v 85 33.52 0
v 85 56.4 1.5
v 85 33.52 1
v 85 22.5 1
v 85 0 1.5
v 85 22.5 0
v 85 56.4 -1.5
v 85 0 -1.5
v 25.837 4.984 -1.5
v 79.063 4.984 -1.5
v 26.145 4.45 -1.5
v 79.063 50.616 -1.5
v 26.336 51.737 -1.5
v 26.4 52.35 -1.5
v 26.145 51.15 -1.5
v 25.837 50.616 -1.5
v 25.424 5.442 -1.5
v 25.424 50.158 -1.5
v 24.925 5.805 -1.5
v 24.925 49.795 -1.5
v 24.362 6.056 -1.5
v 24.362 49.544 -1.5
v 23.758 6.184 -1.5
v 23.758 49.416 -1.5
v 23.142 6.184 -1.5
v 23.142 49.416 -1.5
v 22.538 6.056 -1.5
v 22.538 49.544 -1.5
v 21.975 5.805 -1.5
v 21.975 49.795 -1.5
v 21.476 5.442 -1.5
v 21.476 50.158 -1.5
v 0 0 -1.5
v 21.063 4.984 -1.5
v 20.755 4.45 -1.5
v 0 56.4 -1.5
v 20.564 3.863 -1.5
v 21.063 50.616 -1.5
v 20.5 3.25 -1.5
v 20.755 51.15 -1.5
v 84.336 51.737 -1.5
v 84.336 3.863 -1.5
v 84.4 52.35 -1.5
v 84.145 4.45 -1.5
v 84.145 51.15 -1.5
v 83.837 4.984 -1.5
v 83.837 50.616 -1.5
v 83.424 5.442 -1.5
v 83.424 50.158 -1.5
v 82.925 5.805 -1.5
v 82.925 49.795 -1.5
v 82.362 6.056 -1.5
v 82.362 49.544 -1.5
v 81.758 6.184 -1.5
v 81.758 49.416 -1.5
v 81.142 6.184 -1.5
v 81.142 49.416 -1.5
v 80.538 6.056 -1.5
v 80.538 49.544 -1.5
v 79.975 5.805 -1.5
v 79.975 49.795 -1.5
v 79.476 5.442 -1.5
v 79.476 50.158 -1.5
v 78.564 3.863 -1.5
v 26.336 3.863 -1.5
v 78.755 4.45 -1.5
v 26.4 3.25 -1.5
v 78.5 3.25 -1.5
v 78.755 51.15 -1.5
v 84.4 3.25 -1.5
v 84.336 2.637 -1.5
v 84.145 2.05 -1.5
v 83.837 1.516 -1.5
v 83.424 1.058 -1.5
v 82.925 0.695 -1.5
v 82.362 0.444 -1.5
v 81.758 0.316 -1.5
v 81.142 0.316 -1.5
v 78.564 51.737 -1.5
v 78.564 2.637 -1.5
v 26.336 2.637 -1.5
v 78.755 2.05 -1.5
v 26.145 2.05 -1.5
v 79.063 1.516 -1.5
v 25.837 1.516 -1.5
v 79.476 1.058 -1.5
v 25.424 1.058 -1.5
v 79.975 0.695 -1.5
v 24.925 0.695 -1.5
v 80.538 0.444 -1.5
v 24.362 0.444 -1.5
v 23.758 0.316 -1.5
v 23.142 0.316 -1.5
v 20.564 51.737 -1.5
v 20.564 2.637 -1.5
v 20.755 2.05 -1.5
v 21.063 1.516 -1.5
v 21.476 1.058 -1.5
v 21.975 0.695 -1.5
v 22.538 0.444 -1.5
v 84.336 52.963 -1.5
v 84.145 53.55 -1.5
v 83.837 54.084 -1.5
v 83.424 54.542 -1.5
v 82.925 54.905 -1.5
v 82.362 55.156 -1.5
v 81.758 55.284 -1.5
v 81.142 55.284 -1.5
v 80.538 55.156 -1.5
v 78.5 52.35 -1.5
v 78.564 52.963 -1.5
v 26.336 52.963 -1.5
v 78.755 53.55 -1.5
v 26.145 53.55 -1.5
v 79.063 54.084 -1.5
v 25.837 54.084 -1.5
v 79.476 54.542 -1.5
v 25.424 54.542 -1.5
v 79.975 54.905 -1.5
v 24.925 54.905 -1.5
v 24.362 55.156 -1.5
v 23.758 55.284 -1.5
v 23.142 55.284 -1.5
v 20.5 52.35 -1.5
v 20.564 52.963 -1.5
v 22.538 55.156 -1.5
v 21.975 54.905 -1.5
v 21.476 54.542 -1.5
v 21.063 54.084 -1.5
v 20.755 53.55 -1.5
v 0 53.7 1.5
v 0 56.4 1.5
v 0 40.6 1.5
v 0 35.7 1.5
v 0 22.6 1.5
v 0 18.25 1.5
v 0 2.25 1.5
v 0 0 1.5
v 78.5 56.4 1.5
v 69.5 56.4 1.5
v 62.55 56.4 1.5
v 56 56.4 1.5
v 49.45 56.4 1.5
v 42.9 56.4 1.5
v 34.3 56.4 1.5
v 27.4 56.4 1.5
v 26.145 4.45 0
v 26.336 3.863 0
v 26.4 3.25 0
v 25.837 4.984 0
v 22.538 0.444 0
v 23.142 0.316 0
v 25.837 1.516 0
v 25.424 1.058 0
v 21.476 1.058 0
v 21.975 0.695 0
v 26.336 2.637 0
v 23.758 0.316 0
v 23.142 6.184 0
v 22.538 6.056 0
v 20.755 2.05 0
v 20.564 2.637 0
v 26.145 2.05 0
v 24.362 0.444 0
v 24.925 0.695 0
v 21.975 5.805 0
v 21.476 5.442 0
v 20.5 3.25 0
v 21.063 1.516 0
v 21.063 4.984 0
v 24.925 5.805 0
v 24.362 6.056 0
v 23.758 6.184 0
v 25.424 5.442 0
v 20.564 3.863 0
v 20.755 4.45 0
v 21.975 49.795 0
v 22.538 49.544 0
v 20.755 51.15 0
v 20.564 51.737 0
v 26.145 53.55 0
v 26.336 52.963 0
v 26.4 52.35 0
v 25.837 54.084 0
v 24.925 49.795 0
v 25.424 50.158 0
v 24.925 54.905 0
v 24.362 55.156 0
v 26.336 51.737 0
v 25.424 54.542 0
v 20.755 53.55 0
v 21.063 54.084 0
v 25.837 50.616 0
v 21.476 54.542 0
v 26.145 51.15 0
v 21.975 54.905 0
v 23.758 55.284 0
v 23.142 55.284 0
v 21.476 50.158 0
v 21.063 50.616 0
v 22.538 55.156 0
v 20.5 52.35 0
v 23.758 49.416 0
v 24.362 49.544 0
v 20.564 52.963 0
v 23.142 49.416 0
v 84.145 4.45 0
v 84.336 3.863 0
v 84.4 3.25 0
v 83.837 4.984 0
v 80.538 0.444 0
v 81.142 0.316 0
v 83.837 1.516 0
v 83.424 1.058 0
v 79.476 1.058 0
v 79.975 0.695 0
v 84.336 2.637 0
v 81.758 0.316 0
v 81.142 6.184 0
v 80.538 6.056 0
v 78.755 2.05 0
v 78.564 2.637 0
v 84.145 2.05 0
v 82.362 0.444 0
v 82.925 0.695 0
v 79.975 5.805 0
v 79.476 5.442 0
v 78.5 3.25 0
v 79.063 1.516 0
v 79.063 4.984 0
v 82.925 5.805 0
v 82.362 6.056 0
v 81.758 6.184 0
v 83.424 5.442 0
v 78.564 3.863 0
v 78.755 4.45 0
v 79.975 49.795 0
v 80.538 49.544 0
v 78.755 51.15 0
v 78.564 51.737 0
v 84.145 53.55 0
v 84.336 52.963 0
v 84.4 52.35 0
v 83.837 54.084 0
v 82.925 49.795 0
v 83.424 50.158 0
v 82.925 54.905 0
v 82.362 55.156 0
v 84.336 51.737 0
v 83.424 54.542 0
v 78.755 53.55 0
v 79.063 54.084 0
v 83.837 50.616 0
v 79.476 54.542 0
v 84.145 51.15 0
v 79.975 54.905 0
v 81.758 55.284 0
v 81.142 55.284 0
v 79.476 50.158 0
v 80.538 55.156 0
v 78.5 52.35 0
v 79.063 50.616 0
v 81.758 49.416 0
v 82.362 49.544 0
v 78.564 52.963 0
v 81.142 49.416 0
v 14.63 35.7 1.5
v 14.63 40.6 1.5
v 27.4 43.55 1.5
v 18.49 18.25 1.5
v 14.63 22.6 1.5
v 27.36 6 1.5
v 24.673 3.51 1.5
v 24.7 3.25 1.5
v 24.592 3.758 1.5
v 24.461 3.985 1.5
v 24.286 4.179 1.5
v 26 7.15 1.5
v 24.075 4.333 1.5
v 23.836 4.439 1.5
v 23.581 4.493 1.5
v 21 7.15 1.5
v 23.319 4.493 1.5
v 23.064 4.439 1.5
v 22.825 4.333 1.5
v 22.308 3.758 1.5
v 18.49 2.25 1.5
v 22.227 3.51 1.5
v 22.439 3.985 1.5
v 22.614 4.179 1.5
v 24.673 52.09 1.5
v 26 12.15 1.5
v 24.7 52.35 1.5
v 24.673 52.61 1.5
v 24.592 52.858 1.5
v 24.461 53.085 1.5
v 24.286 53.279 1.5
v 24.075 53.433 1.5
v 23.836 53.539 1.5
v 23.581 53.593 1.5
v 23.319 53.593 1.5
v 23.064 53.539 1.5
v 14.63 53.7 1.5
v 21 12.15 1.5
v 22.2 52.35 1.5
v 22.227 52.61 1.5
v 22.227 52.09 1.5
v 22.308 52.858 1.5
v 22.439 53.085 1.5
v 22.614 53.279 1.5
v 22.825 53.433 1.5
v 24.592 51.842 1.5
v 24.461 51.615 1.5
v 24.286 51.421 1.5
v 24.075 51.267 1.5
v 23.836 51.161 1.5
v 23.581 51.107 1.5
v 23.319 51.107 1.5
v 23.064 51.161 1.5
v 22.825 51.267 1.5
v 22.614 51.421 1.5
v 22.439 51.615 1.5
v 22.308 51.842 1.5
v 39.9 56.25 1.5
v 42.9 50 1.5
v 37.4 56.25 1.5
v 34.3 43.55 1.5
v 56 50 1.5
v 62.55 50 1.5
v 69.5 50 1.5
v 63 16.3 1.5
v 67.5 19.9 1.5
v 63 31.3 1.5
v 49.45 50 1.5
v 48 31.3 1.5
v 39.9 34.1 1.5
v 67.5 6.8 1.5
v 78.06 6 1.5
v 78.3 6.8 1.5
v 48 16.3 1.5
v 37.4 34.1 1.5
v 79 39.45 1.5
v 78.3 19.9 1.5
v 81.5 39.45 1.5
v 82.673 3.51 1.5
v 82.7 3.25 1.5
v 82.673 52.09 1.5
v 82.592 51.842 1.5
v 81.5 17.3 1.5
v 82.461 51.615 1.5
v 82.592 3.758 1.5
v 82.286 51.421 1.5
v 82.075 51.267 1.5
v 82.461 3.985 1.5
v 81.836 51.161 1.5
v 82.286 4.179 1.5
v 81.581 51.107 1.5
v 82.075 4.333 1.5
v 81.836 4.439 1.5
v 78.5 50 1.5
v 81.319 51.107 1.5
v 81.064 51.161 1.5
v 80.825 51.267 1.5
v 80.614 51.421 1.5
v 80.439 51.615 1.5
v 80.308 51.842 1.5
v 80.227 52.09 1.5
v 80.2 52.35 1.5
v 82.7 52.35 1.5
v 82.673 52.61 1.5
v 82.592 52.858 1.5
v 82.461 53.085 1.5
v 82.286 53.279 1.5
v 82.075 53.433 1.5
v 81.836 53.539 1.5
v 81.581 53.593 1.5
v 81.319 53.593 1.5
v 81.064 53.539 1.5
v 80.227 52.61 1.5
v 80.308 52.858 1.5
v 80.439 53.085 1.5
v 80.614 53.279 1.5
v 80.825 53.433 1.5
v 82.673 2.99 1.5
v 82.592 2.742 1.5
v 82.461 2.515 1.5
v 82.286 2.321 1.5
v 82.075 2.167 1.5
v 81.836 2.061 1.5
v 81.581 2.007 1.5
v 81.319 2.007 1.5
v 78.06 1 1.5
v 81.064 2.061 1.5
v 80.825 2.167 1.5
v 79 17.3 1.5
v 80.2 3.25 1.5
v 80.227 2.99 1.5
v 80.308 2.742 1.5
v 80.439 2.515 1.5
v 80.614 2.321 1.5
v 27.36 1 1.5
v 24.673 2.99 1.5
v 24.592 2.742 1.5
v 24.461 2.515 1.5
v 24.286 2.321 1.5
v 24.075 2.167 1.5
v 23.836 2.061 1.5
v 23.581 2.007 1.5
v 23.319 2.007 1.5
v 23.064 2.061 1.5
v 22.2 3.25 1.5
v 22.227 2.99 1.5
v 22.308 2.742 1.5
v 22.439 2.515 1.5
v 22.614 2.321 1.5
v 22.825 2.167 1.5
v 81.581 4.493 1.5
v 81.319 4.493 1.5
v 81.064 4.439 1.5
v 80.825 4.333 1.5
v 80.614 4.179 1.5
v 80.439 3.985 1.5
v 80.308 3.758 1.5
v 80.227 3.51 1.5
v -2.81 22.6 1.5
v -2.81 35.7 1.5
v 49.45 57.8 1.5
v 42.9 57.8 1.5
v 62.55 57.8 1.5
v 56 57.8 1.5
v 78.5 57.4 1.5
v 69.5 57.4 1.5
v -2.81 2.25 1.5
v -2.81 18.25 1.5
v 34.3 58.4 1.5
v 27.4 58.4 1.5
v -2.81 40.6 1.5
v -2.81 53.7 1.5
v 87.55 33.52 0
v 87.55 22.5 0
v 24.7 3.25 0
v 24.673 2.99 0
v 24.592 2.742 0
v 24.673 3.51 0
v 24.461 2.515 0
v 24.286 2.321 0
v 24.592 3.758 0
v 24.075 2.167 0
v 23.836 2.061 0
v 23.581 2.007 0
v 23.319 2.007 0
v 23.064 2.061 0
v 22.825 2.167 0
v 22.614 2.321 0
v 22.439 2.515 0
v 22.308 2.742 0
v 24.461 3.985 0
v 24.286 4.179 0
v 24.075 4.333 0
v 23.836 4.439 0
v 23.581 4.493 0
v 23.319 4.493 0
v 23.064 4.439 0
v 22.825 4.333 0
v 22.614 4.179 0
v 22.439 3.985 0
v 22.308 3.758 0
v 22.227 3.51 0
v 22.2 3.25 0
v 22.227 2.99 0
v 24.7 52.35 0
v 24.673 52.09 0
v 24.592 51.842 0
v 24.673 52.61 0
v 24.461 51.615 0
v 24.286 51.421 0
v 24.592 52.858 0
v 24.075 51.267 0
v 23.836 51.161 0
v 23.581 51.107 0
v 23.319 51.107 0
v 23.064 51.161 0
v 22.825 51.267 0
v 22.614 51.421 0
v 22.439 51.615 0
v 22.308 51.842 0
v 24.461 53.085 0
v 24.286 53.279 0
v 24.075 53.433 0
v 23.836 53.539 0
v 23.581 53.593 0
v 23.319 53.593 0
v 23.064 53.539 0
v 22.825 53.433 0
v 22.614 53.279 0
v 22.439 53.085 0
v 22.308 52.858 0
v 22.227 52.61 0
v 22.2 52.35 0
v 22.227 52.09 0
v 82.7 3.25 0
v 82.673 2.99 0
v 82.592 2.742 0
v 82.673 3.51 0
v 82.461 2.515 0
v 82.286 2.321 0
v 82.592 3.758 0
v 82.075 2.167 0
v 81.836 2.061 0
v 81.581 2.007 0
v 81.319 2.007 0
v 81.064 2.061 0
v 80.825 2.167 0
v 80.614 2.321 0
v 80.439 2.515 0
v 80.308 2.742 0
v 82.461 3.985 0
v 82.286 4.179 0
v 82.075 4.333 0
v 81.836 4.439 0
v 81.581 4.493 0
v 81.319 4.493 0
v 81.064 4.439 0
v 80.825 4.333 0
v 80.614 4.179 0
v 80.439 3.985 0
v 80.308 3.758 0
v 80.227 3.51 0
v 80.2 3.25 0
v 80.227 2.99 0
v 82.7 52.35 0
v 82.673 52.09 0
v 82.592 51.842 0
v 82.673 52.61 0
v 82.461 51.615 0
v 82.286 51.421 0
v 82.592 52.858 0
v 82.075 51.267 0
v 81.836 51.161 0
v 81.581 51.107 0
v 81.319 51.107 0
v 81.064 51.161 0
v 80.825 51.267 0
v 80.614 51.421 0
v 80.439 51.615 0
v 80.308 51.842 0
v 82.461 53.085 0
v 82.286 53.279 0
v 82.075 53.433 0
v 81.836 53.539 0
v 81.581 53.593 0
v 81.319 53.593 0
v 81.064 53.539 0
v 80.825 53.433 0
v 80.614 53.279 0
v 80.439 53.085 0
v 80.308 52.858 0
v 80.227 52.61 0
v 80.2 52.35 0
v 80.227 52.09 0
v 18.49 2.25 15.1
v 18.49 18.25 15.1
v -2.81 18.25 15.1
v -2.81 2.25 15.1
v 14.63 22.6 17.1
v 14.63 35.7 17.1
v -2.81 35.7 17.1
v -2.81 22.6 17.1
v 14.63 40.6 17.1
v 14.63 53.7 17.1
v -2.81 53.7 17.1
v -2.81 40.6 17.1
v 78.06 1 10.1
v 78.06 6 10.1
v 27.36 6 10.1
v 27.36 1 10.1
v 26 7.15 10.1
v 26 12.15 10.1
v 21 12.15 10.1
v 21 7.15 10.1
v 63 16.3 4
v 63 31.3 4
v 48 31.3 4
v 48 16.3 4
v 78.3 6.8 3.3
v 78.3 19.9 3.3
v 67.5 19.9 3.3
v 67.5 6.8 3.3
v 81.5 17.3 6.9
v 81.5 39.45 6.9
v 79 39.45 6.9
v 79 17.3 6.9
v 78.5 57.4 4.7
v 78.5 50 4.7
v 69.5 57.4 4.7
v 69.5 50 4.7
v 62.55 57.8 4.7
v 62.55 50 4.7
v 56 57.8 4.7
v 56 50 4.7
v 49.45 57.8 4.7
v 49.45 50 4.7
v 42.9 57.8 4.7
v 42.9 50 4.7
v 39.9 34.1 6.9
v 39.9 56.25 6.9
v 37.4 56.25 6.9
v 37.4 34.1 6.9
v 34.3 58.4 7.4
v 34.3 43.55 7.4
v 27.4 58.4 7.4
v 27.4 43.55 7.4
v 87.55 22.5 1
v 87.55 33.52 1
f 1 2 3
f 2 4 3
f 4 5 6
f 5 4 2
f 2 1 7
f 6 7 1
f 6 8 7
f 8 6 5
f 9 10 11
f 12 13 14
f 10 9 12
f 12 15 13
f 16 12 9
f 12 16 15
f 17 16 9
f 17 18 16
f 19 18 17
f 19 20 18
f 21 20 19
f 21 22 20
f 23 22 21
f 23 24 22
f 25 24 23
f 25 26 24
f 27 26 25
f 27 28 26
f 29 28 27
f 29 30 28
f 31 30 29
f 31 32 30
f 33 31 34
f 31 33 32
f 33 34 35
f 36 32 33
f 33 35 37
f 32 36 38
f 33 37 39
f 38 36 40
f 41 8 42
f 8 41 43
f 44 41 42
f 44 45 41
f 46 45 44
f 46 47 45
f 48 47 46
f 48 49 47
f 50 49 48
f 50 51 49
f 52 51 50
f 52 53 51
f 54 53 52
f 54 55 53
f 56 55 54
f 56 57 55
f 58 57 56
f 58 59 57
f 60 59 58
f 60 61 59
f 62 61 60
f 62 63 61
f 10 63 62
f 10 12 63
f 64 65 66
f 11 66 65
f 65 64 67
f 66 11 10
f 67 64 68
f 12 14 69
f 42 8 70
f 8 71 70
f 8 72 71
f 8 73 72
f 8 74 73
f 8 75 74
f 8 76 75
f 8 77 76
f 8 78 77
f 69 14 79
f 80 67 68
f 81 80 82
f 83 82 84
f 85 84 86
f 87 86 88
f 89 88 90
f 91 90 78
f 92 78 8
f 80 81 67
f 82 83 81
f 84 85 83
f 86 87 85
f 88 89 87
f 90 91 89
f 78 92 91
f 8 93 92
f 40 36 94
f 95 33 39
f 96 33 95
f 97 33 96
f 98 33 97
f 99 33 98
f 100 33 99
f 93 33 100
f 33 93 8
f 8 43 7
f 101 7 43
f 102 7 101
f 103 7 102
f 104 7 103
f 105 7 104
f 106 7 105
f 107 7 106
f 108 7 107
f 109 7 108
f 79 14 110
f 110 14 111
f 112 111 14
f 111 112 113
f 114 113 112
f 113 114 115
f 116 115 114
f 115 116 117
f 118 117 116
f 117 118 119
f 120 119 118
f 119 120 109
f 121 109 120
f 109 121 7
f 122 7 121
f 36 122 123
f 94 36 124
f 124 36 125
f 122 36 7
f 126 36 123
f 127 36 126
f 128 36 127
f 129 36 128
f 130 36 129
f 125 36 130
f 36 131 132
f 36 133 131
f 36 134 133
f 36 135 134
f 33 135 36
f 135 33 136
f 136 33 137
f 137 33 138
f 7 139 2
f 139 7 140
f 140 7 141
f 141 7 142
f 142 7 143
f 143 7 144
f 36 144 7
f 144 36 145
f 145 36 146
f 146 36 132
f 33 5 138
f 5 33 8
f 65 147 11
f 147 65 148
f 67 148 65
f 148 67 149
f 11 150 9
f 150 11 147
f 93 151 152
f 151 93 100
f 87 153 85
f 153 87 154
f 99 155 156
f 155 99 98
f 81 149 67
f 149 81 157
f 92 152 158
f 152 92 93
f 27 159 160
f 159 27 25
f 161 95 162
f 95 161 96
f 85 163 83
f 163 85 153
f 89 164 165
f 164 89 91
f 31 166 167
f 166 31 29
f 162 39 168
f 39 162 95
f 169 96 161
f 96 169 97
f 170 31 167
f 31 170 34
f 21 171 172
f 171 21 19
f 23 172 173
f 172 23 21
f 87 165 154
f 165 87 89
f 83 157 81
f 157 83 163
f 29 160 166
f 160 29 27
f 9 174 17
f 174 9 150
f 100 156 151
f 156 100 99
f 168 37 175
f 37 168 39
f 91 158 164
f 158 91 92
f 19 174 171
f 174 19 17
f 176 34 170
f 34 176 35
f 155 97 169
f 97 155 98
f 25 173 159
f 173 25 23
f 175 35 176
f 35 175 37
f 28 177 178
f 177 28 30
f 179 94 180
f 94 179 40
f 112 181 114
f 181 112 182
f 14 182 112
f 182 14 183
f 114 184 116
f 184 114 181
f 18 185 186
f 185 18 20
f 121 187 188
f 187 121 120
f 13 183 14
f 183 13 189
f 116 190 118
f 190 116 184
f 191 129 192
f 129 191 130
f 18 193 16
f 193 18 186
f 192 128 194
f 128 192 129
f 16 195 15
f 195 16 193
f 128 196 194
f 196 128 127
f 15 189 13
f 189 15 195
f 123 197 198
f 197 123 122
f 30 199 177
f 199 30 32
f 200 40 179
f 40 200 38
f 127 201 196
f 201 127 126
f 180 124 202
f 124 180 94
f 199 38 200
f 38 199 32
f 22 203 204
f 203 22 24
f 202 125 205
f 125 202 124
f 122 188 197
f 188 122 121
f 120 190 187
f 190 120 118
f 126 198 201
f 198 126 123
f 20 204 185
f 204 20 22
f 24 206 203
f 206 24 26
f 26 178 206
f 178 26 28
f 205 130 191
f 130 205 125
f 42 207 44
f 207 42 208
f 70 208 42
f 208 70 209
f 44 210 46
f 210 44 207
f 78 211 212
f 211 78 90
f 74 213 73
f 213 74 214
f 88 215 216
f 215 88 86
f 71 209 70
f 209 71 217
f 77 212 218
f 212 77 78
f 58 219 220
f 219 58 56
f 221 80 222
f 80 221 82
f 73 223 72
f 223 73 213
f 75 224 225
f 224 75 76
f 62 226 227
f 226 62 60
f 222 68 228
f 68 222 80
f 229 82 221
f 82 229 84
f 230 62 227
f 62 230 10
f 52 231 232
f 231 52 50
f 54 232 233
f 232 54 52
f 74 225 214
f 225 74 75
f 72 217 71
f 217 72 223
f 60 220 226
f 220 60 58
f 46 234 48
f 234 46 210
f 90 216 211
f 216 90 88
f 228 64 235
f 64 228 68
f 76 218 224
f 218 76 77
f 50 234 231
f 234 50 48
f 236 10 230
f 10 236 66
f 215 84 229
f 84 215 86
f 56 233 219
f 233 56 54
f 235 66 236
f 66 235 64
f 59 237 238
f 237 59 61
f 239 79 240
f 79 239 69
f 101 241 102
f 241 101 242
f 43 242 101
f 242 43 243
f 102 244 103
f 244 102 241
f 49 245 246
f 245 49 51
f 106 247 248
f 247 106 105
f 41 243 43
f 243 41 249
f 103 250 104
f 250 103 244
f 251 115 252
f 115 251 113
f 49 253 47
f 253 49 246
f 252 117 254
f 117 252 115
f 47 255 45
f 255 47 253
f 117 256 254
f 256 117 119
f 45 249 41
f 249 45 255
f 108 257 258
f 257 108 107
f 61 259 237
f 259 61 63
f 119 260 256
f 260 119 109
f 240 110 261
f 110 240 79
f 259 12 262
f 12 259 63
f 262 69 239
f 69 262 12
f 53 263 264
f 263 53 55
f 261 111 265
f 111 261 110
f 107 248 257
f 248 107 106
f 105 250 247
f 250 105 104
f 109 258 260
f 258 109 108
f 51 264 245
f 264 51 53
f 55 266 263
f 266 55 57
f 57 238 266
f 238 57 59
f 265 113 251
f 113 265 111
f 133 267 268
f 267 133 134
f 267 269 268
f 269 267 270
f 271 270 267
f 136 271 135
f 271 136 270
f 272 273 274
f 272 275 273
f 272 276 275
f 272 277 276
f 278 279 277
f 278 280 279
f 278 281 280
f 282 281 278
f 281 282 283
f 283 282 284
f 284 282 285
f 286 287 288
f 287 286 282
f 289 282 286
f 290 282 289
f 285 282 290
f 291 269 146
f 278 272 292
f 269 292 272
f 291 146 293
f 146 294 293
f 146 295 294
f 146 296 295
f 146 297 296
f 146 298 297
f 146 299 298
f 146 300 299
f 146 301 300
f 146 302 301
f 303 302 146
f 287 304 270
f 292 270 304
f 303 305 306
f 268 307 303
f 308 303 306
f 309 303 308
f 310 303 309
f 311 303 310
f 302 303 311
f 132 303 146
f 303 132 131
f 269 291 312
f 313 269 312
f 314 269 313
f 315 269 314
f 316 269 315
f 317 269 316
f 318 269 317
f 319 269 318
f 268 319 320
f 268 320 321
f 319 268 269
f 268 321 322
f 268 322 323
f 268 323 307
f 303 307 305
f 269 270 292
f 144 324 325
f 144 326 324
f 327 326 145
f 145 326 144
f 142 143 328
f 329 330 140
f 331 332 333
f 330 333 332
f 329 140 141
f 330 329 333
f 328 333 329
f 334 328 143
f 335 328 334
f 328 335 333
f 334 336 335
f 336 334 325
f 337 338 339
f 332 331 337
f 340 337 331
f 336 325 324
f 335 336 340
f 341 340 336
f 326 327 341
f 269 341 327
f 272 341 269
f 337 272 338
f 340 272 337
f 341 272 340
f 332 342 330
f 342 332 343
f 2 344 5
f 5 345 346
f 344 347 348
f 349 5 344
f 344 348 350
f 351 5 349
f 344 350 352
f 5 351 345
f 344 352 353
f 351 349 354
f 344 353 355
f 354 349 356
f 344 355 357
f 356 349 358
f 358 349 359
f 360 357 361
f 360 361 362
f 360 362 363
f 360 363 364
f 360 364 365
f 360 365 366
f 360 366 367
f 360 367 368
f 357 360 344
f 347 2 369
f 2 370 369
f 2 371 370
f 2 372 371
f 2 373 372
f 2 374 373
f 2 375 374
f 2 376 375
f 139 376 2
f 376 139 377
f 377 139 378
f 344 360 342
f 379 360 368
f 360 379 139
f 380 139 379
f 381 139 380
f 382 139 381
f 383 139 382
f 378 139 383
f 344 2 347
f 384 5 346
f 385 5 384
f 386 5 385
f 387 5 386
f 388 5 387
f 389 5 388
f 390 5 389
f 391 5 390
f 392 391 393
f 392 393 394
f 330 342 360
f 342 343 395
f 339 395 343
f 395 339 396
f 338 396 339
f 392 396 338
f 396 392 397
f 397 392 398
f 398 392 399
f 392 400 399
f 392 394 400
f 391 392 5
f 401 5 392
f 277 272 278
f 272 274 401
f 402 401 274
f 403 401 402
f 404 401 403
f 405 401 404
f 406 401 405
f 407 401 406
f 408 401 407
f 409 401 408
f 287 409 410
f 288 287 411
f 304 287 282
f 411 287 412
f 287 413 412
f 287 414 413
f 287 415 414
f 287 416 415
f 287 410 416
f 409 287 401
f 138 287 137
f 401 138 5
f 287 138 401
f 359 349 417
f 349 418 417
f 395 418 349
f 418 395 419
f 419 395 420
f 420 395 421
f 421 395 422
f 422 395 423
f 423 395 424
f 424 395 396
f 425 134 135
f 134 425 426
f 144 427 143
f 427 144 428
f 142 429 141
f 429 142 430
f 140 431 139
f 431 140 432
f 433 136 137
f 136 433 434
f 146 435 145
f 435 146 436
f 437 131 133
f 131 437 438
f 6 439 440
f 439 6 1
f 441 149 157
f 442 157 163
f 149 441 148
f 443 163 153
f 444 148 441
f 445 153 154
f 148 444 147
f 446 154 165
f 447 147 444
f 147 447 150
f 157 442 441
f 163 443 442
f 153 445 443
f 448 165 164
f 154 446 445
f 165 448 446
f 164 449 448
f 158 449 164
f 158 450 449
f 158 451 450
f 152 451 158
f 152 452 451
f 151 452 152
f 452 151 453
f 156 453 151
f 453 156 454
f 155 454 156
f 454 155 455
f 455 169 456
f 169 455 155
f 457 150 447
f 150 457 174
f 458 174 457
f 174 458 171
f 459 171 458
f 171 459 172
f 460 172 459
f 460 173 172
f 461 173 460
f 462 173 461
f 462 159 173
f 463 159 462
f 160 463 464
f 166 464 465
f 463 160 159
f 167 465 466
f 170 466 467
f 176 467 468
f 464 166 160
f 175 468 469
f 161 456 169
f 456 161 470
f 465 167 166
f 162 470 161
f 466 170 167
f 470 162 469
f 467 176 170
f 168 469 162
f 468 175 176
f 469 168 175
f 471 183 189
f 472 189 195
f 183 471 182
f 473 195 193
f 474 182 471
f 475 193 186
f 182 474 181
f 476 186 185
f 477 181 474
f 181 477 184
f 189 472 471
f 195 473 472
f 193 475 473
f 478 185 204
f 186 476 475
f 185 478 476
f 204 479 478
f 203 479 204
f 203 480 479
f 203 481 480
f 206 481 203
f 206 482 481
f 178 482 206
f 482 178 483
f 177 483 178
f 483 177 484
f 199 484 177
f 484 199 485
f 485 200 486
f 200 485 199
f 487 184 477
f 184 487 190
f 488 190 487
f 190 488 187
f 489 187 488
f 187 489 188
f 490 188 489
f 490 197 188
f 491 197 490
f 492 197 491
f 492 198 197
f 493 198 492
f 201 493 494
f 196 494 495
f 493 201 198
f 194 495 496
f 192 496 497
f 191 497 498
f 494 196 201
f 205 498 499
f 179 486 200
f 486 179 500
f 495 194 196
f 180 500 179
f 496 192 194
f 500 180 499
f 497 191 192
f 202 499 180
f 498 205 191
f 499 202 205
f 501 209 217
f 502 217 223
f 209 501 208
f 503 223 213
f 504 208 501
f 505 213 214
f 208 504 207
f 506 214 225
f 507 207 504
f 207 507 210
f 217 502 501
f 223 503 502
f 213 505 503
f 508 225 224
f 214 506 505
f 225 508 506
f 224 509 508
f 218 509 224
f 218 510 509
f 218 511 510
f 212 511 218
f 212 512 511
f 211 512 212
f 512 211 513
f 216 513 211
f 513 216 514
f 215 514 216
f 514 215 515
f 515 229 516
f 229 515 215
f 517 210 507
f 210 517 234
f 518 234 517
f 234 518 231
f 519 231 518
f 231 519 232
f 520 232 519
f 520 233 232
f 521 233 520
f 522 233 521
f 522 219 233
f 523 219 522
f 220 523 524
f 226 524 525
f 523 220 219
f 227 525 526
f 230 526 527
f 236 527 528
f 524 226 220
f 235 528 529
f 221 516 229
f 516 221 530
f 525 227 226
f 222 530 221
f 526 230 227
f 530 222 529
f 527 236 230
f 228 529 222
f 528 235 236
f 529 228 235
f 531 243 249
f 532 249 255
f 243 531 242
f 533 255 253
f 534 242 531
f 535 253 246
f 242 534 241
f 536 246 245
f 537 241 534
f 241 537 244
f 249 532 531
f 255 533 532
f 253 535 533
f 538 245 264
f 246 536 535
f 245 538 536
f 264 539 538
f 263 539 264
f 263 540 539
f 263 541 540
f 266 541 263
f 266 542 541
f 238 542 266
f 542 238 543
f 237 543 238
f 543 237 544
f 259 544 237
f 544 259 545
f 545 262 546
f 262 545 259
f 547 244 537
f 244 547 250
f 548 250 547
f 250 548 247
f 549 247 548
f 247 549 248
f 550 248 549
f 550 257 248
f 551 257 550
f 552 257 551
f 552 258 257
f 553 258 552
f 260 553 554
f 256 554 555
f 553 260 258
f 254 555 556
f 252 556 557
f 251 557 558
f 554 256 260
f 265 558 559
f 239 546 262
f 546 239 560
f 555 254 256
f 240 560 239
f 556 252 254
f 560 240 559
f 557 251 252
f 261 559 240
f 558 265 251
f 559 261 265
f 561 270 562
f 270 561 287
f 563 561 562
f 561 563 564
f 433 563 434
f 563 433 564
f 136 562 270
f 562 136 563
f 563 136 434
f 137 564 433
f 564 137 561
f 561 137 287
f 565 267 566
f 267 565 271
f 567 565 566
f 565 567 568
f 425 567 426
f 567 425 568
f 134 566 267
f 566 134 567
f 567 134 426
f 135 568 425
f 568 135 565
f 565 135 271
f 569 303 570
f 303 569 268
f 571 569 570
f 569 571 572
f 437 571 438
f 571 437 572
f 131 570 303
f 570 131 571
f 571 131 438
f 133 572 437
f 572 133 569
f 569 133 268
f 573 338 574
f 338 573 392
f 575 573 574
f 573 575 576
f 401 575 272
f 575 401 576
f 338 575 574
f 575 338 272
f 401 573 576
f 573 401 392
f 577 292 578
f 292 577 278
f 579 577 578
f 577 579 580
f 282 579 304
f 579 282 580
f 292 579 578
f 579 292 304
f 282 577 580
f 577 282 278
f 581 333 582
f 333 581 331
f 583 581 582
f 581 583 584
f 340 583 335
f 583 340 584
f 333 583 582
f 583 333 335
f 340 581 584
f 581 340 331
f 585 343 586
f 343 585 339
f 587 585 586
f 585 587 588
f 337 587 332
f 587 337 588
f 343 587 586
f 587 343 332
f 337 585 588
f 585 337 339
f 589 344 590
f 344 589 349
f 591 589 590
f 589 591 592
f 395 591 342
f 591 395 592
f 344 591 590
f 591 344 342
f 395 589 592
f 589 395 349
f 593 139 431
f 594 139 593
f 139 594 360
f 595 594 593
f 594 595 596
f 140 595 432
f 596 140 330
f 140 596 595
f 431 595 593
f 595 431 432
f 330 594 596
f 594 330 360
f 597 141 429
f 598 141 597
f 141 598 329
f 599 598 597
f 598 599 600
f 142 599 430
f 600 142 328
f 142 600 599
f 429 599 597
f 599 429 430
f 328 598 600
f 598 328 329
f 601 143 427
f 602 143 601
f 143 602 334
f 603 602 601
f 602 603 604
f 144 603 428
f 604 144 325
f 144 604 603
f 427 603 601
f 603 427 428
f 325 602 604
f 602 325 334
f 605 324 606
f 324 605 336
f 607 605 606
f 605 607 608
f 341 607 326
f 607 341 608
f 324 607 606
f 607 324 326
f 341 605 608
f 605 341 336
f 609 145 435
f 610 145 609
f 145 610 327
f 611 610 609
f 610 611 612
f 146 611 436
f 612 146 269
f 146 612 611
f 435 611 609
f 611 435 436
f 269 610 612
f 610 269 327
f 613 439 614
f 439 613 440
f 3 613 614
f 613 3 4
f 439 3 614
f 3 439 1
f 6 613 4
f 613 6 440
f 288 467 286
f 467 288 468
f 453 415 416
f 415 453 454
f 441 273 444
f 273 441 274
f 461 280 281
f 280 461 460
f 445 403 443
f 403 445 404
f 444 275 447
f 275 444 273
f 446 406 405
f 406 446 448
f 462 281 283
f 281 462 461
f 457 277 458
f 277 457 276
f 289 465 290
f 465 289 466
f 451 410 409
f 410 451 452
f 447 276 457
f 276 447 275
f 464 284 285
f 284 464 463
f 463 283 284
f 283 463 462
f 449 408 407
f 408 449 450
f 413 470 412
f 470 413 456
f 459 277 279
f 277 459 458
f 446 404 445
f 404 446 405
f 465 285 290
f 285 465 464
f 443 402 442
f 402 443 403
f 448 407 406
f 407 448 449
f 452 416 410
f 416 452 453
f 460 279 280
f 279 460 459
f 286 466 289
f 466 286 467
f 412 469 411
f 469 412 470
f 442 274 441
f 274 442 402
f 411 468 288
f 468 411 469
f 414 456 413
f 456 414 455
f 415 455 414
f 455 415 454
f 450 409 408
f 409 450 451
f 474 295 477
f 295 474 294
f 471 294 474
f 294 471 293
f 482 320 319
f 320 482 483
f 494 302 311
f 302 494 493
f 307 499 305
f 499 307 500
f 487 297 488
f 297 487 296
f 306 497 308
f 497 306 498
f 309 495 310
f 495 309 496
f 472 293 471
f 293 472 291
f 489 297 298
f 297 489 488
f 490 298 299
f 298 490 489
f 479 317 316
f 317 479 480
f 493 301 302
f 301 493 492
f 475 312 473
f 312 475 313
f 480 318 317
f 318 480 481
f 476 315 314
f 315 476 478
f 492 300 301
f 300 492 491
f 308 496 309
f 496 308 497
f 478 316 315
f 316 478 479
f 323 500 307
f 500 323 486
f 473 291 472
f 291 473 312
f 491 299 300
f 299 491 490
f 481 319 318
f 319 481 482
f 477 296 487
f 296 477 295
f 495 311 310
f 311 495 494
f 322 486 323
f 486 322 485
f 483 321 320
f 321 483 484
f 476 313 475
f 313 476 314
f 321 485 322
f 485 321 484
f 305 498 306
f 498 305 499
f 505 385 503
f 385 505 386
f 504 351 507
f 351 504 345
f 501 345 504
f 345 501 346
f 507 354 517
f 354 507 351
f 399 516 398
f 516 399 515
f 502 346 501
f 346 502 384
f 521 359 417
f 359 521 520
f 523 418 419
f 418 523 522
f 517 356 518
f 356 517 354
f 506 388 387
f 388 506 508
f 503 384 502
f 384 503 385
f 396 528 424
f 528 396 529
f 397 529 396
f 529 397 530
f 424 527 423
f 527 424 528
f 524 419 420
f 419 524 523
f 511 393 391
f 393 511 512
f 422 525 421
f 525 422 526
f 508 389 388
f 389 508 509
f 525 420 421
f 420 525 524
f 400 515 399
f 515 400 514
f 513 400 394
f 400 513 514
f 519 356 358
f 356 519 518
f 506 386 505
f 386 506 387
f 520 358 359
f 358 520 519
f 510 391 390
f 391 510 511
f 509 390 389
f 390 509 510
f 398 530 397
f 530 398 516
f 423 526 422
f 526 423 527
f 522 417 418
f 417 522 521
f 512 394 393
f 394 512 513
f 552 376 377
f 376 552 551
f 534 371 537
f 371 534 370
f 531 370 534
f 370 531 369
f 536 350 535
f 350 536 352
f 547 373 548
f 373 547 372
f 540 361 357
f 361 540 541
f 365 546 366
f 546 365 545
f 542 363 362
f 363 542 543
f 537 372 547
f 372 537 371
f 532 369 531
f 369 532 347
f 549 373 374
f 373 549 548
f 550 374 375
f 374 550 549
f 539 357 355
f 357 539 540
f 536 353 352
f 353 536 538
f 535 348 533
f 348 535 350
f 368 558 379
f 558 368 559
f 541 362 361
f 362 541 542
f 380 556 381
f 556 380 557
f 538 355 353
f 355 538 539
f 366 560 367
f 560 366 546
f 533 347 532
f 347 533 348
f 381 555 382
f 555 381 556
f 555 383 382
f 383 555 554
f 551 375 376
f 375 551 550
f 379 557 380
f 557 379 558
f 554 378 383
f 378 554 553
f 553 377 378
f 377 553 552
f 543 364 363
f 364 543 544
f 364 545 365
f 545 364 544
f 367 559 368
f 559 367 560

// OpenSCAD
// Raspberry pi 4 model by George Onoufriou (Raven, GeorgeRaven, Archer) C 2019-06-30
// please see licence in project root https://github.com/DreamingRaven/RavenSCAD/blob/master/LICENSE

board_thickness = 1.5; // the space for the board itself only
pin_space = 2.2; // the min space that the throughhole components require underneath
$fn = 30; // how detailed the circular components are (holes + mounts), not super important

difference(){ // this creates the mount holes
  translate([0,0,board_thickness]){ // two translations cancel out but make maths simpler before they do
    translate([0,0,-(board_thickness)]) // the translation which ^ cancels out
    {
      cube([85,56.4,board_thickness]); // board + underpins
    }
    // these are the big surface level components
    translate([-2.81,2.25,0]) cube([21.3,16,13.6]);     // Ethenrnet port
    translate([-2.81,22.6,0]) cube([17.44,13.1,15.6]);  // USB 3.0
    translate([-2.81,40.6,0]) cube([17.44,13.1,15.6]);  // USB 2.0
    translate([27.36,1,0]) cube([50.7,5.0,8.6]);        // GPIO pins
    translate([21,7.15,0]) cube([5.0,5.0,8.6]);         // Power over ethernet pins
    translate([48.0,16.3,0]) cube([15.0,15.0,2.5]);     // cpu
    translate([67.5,6.8,0]) cube([10.8,13.1,1.8]);      // onboard wifi
    translate([79,17.3,0]) cube([2.5,22.15,5.4]);       // display connector
    translate([69.5,50,0]) cube([9,7.4,3.2]);           // USB type c power
    translate([56.0,50,0]) cube([6.55,7.8,3.2]);        // Micro HDMI0
    translate([42.9,50,0]) cube([6.55,7.8,3.2]);        // Micro HDMI1
    translate([37.4,34.1,0]) cube([2.5,22.15,5.4]);     // CSI camera connector
    translate([27.4,43.55,0]) cube([6.9,14.85,5.9]);    // Audio jack
    translate([85,22.5,-board_thickness]) cube([2.55,11.02,1.0]); // SD card (poking out)

    difference(){ // this creates the mount points around the mount holes esp the underneath ones
      translate([0,0,-(2*board_thickness)]) cube([85,56.4,pin_space]); // underpins only
      translate([22.2,2,0]) translate([1.25,1.25,0]) cylinder(10,d=5.9, center=true);     // mount top-r
      translate([22.2,51.1,0]) translate([1.25,1.25,0]) cylinder(10,d=5.9, center=true);  // mount bot-r
      translate([80.2,2,0]) translate([1.25,1.25,0]) cylinder(10,d=5.9, center=true);     // mount top-l
      translate([80.2,51.1,0]) translate([1.25,1.25,0]) cylinder(10,d=5.9, center=true);  // mount bot-l
    }
  } // end of translation cancel

  // these are the end holes for mounting
  translate([22.2,2,0]) translate([1.25,1.25,0]) cylinder(15,d=2.5, center=true);     // hole  top-r
  translate([22.2,51.1,0]) translate([1.25,1.25,0]) cylinder(15,d=2.5, center=true);  // hole  bot-r
  translate([80.2,2,0]) translate([1.25,1.25,0]) cylinder(15,d=2.5, center=true);     // hole  top-l
  translate([80.2,51.1,0]) translate([1.25,1.25,0]) cylinder(15,d=2.5, center=true);  // hole  bot-l
}
